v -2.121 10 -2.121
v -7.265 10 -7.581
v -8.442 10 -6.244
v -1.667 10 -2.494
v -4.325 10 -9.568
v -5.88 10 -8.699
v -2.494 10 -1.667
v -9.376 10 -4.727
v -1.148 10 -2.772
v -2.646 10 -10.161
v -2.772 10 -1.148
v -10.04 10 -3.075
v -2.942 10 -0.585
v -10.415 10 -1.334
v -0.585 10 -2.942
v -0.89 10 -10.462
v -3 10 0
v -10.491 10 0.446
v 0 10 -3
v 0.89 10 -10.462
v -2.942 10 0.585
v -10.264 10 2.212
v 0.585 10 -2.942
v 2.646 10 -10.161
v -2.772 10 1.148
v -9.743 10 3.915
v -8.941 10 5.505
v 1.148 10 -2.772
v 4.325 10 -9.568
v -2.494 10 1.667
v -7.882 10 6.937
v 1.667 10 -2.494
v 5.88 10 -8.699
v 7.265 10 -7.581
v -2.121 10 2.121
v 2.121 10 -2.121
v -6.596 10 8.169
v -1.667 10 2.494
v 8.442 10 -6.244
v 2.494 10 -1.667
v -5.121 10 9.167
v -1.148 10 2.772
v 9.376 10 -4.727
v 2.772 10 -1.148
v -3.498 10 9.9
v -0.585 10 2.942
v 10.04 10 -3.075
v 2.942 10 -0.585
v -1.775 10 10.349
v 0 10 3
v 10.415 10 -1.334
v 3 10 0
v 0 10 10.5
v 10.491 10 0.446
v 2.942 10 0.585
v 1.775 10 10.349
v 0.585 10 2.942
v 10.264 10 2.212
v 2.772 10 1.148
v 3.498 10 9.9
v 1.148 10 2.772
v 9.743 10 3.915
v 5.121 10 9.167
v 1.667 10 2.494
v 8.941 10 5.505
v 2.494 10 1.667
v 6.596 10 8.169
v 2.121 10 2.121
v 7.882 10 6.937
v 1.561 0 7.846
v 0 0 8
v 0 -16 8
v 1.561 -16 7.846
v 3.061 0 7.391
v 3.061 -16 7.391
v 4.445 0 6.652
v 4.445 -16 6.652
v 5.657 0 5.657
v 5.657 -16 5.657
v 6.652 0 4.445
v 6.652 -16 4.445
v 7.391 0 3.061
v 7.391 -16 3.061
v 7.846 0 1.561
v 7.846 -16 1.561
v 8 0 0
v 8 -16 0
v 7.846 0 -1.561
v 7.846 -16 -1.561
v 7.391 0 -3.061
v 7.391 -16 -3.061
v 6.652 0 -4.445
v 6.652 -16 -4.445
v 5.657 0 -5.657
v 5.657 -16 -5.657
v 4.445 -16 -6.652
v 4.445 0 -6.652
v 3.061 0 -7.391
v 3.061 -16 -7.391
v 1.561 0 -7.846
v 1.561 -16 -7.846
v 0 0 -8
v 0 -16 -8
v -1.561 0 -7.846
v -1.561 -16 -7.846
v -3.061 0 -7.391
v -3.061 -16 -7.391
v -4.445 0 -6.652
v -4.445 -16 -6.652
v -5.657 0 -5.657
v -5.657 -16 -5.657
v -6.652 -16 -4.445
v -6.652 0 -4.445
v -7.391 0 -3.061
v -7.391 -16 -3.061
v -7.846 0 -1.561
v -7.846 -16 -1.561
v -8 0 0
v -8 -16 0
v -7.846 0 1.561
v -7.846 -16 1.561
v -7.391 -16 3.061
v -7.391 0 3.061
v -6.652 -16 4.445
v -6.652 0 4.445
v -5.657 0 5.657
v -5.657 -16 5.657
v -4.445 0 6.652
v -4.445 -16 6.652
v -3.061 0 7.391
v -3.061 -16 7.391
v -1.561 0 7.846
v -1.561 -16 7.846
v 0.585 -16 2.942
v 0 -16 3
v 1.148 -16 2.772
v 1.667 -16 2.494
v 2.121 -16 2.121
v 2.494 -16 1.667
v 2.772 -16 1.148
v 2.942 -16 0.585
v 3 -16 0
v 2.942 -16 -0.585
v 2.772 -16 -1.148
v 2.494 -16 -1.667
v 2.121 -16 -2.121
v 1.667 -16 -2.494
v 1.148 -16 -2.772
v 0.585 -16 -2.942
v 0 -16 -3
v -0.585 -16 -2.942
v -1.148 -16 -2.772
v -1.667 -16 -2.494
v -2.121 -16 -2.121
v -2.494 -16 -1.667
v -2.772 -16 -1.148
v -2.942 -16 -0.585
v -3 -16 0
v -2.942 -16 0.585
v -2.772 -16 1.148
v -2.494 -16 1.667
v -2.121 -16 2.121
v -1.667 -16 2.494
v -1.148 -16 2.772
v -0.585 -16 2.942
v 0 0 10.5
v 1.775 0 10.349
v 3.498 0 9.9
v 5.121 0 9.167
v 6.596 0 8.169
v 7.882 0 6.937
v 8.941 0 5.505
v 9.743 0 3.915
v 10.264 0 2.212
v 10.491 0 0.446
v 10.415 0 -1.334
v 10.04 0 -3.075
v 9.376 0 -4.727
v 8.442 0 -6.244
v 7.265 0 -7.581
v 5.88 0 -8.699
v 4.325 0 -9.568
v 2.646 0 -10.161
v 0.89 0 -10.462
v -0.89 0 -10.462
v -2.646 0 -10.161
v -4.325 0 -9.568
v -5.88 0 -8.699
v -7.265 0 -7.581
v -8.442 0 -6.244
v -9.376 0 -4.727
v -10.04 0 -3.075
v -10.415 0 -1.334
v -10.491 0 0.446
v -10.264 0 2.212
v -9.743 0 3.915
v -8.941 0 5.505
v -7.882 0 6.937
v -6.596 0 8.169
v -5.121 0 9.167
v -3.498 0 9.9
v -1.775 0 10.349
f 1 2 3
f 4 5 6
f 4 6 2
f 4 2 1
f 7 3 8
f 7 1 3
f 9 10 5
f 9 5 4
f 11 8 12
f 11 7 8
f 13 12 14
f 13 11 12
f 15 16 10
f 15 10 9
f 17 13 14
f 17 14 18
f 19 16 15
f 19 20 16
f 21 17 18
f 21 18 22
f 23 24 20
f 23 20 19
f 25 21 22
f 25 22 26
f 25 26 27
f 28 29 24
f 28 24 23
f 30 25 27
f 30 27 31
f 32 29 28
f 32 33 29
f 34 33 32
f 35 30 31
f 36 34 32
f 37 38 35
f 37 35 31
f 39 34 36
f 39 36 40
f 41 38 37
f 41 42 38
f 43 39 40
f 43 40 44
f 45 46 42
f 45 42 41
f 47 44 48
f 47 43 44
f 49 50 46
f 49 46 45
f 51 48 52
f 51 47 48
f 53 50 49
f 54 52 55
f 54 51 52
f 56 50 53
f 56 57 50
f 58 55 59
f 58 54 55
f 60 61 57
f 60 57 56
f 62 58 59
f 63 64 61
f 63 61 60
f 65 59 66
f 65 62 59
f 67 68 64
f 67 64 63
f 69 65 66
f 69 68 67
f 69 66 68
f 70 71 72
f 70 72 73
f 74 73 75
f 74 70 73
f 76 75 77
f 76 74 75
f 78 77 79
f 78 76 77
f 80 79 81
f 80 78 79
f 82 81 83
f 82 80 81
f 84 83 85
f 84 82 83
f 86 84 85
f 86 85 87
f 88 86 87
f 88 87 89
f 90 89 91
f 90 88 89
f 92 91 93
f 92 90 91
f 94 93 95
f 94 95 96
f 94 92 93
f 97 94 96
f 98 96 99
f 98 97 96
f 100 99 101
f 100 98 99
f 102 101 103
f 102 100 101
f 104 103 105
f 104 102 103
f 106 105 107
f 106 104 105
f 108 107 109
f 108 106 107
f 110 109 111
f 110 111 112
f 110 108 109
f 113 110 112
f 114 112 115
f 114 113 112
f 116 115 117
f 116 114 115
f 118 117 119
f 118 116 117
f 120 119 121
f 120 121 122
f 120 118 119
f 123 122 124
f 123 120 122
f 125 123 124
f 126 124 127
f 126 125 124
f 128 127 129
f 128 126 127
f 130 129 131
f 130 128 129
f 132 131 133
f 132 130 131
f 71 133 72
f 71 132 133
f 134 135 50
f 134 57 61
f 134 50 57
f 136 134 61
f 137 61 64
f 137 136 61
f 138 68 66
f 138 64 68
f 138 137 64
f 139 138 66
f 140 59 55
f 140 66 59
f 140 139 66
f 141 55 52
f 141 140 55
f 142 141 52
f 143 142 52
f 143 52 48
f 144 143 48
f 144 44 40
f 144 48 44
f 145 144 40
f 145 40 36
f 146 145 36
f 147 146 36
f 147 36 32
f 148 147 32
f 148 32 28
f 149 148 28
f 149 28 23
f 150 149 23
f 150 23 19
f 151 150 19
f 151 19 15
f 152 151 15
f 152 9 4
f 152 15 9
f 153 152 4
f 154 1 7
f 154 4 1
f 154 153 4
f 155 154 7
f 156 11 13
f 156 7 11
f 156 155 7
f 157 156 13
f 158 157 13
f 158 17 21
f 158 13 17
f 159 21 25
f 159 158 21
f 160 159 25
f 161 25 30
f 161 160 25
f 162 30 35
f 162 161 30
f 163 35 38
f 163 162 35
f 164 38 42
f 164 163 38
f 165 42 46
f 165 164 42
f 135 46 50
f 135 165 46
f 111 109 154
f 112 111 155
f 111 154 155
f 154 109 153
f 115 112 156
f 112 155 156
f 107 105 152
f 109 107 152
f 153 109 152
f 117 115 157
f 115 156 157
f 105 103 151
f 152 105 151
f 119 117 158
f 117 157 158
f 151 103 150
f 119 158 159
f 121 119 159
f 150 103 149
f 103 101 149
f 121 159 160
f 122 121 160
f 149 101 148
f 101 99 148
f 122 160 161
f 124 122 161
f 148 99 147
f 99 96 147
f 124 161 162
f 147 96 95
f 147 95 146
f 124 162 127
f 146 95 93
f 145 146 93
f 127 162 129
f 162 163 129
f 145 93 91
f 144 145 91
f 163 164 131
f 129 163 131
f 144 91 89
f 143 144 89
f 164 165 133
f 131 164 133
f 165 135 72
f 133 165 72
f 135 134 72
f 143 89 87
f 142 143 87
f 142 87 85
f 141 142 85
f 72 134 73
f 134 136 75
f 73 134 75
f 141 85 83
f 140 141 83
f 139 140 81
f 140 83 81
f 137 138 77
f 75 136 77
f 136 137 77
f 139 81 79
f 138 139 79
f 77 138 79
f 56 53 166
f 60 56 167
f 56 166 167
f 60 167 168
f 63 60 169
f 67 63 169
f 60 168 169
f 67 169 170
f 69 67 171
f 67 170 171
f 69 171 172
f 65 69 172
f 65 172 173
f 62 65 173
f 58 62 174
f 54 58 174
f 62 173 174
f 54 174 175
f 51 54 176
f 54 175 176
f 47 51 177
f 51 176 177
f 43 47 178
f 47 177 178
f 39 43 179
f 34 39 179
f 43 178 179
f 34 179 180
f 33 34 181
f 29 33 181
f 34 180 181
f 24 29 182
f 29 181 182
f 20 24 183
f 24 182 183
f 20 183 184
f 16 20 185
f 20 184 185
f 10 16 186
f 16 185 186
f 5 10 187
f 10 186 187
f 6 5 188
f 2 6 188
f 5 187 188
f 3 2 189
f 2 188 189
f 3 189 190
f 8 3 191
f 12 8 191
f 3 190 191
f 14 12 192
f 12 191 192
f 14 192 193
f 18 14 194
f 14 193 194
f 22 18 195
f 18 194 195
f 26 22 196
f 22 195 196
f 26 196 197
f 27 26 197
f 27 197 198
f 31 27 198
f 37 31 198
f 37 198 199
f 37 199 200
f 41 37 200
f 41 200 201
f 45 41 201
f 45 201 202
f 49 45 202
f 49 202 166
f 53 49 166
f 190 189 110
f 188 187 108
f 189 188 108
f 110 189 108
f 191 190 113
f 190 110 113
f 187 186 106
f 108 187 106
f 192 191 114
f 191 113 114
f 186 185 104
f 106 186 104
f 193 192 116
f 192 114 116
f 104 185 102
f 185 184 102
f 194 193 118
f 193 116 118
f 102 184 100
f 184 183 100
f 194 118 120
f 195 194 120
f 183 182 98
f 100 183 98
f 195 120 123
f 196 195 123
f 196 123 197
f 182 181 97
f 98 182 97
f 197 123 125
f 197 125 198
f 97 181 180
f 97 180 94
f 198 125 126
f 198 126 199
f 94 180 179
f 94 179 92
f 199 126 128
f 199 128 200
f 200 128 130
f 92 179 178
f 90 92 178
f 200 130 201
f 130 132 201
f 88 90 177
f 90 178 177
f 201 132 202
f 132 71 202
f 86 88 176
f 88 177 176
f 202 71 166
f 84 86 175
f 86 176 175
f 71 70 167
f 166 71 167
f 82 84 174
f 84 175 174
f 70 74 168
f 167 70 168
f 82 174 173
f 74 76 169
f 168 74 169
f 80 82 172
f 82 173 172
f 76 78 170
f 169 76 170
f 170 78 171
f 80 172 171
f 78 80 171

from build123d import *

# Parameters (mm, degrees)
SKETCH1_R               = 10.5
BOSS_EXTRUDE1_DEPTH     = 10
SKETCH2_R               = 8
BOSS_EXTRUDE2_DEPTH     = 16
CUT_EXTRUDE1_DEPTH      = 22.828879953
CUT_EXTRUDE1_DEPTH_BACK = 22.828879953
SKETCH3_R               = 3


with BuildPart() as part:
    # Sketch1 → Boss-Extrude1 (new body)
    with BuildSketch(Plane(origin=(0, 0, 0), x_dir=(1, 0, 0), z_dir=(0, 1, 0))):
        with Locations(Location((0, 0, 0), (0, 0, 270))):
            Circle(SKETCH1_R)
    extrude(amount=BOSS_EXTRUDE1_DEPTH)

    # Sketch2 → Boss-Extrude2 (add)
    with BuildSketch(Plane(origin=(0, 0, 0), x_dir=(1, 0, 0), z_dir=(0, 1, 0))):
        with Locations(Location((0, 0, 0), (0, 0, 270))):
            Circle(SKETCH2_R)
    extrude(amount=-BOSS_EXTRUDE2_DEPTH)

    # Sketch3 → Cut-Extrude1 (cut, two sides: drawn at the far end of the back side and taken through both)
    with BuildSketch(Plane(origin=(0, 0, 0), x_dir=(1, 0, 0), z_dir=(0, 1, 0)).offset(-CUT_EXTRUDE1_DEPTH_BACK)):
        with Locations(Location((0, 0, 0), (0, 0, 270))):
            Circle(SKETCH3_R)
    extrude(amount=CUT_EXTRUDE1_DEPTH + CUT_EXTRUDE1_DEPTH_BACK, mode=Mode.SUBTRACT)


solid = part.part
